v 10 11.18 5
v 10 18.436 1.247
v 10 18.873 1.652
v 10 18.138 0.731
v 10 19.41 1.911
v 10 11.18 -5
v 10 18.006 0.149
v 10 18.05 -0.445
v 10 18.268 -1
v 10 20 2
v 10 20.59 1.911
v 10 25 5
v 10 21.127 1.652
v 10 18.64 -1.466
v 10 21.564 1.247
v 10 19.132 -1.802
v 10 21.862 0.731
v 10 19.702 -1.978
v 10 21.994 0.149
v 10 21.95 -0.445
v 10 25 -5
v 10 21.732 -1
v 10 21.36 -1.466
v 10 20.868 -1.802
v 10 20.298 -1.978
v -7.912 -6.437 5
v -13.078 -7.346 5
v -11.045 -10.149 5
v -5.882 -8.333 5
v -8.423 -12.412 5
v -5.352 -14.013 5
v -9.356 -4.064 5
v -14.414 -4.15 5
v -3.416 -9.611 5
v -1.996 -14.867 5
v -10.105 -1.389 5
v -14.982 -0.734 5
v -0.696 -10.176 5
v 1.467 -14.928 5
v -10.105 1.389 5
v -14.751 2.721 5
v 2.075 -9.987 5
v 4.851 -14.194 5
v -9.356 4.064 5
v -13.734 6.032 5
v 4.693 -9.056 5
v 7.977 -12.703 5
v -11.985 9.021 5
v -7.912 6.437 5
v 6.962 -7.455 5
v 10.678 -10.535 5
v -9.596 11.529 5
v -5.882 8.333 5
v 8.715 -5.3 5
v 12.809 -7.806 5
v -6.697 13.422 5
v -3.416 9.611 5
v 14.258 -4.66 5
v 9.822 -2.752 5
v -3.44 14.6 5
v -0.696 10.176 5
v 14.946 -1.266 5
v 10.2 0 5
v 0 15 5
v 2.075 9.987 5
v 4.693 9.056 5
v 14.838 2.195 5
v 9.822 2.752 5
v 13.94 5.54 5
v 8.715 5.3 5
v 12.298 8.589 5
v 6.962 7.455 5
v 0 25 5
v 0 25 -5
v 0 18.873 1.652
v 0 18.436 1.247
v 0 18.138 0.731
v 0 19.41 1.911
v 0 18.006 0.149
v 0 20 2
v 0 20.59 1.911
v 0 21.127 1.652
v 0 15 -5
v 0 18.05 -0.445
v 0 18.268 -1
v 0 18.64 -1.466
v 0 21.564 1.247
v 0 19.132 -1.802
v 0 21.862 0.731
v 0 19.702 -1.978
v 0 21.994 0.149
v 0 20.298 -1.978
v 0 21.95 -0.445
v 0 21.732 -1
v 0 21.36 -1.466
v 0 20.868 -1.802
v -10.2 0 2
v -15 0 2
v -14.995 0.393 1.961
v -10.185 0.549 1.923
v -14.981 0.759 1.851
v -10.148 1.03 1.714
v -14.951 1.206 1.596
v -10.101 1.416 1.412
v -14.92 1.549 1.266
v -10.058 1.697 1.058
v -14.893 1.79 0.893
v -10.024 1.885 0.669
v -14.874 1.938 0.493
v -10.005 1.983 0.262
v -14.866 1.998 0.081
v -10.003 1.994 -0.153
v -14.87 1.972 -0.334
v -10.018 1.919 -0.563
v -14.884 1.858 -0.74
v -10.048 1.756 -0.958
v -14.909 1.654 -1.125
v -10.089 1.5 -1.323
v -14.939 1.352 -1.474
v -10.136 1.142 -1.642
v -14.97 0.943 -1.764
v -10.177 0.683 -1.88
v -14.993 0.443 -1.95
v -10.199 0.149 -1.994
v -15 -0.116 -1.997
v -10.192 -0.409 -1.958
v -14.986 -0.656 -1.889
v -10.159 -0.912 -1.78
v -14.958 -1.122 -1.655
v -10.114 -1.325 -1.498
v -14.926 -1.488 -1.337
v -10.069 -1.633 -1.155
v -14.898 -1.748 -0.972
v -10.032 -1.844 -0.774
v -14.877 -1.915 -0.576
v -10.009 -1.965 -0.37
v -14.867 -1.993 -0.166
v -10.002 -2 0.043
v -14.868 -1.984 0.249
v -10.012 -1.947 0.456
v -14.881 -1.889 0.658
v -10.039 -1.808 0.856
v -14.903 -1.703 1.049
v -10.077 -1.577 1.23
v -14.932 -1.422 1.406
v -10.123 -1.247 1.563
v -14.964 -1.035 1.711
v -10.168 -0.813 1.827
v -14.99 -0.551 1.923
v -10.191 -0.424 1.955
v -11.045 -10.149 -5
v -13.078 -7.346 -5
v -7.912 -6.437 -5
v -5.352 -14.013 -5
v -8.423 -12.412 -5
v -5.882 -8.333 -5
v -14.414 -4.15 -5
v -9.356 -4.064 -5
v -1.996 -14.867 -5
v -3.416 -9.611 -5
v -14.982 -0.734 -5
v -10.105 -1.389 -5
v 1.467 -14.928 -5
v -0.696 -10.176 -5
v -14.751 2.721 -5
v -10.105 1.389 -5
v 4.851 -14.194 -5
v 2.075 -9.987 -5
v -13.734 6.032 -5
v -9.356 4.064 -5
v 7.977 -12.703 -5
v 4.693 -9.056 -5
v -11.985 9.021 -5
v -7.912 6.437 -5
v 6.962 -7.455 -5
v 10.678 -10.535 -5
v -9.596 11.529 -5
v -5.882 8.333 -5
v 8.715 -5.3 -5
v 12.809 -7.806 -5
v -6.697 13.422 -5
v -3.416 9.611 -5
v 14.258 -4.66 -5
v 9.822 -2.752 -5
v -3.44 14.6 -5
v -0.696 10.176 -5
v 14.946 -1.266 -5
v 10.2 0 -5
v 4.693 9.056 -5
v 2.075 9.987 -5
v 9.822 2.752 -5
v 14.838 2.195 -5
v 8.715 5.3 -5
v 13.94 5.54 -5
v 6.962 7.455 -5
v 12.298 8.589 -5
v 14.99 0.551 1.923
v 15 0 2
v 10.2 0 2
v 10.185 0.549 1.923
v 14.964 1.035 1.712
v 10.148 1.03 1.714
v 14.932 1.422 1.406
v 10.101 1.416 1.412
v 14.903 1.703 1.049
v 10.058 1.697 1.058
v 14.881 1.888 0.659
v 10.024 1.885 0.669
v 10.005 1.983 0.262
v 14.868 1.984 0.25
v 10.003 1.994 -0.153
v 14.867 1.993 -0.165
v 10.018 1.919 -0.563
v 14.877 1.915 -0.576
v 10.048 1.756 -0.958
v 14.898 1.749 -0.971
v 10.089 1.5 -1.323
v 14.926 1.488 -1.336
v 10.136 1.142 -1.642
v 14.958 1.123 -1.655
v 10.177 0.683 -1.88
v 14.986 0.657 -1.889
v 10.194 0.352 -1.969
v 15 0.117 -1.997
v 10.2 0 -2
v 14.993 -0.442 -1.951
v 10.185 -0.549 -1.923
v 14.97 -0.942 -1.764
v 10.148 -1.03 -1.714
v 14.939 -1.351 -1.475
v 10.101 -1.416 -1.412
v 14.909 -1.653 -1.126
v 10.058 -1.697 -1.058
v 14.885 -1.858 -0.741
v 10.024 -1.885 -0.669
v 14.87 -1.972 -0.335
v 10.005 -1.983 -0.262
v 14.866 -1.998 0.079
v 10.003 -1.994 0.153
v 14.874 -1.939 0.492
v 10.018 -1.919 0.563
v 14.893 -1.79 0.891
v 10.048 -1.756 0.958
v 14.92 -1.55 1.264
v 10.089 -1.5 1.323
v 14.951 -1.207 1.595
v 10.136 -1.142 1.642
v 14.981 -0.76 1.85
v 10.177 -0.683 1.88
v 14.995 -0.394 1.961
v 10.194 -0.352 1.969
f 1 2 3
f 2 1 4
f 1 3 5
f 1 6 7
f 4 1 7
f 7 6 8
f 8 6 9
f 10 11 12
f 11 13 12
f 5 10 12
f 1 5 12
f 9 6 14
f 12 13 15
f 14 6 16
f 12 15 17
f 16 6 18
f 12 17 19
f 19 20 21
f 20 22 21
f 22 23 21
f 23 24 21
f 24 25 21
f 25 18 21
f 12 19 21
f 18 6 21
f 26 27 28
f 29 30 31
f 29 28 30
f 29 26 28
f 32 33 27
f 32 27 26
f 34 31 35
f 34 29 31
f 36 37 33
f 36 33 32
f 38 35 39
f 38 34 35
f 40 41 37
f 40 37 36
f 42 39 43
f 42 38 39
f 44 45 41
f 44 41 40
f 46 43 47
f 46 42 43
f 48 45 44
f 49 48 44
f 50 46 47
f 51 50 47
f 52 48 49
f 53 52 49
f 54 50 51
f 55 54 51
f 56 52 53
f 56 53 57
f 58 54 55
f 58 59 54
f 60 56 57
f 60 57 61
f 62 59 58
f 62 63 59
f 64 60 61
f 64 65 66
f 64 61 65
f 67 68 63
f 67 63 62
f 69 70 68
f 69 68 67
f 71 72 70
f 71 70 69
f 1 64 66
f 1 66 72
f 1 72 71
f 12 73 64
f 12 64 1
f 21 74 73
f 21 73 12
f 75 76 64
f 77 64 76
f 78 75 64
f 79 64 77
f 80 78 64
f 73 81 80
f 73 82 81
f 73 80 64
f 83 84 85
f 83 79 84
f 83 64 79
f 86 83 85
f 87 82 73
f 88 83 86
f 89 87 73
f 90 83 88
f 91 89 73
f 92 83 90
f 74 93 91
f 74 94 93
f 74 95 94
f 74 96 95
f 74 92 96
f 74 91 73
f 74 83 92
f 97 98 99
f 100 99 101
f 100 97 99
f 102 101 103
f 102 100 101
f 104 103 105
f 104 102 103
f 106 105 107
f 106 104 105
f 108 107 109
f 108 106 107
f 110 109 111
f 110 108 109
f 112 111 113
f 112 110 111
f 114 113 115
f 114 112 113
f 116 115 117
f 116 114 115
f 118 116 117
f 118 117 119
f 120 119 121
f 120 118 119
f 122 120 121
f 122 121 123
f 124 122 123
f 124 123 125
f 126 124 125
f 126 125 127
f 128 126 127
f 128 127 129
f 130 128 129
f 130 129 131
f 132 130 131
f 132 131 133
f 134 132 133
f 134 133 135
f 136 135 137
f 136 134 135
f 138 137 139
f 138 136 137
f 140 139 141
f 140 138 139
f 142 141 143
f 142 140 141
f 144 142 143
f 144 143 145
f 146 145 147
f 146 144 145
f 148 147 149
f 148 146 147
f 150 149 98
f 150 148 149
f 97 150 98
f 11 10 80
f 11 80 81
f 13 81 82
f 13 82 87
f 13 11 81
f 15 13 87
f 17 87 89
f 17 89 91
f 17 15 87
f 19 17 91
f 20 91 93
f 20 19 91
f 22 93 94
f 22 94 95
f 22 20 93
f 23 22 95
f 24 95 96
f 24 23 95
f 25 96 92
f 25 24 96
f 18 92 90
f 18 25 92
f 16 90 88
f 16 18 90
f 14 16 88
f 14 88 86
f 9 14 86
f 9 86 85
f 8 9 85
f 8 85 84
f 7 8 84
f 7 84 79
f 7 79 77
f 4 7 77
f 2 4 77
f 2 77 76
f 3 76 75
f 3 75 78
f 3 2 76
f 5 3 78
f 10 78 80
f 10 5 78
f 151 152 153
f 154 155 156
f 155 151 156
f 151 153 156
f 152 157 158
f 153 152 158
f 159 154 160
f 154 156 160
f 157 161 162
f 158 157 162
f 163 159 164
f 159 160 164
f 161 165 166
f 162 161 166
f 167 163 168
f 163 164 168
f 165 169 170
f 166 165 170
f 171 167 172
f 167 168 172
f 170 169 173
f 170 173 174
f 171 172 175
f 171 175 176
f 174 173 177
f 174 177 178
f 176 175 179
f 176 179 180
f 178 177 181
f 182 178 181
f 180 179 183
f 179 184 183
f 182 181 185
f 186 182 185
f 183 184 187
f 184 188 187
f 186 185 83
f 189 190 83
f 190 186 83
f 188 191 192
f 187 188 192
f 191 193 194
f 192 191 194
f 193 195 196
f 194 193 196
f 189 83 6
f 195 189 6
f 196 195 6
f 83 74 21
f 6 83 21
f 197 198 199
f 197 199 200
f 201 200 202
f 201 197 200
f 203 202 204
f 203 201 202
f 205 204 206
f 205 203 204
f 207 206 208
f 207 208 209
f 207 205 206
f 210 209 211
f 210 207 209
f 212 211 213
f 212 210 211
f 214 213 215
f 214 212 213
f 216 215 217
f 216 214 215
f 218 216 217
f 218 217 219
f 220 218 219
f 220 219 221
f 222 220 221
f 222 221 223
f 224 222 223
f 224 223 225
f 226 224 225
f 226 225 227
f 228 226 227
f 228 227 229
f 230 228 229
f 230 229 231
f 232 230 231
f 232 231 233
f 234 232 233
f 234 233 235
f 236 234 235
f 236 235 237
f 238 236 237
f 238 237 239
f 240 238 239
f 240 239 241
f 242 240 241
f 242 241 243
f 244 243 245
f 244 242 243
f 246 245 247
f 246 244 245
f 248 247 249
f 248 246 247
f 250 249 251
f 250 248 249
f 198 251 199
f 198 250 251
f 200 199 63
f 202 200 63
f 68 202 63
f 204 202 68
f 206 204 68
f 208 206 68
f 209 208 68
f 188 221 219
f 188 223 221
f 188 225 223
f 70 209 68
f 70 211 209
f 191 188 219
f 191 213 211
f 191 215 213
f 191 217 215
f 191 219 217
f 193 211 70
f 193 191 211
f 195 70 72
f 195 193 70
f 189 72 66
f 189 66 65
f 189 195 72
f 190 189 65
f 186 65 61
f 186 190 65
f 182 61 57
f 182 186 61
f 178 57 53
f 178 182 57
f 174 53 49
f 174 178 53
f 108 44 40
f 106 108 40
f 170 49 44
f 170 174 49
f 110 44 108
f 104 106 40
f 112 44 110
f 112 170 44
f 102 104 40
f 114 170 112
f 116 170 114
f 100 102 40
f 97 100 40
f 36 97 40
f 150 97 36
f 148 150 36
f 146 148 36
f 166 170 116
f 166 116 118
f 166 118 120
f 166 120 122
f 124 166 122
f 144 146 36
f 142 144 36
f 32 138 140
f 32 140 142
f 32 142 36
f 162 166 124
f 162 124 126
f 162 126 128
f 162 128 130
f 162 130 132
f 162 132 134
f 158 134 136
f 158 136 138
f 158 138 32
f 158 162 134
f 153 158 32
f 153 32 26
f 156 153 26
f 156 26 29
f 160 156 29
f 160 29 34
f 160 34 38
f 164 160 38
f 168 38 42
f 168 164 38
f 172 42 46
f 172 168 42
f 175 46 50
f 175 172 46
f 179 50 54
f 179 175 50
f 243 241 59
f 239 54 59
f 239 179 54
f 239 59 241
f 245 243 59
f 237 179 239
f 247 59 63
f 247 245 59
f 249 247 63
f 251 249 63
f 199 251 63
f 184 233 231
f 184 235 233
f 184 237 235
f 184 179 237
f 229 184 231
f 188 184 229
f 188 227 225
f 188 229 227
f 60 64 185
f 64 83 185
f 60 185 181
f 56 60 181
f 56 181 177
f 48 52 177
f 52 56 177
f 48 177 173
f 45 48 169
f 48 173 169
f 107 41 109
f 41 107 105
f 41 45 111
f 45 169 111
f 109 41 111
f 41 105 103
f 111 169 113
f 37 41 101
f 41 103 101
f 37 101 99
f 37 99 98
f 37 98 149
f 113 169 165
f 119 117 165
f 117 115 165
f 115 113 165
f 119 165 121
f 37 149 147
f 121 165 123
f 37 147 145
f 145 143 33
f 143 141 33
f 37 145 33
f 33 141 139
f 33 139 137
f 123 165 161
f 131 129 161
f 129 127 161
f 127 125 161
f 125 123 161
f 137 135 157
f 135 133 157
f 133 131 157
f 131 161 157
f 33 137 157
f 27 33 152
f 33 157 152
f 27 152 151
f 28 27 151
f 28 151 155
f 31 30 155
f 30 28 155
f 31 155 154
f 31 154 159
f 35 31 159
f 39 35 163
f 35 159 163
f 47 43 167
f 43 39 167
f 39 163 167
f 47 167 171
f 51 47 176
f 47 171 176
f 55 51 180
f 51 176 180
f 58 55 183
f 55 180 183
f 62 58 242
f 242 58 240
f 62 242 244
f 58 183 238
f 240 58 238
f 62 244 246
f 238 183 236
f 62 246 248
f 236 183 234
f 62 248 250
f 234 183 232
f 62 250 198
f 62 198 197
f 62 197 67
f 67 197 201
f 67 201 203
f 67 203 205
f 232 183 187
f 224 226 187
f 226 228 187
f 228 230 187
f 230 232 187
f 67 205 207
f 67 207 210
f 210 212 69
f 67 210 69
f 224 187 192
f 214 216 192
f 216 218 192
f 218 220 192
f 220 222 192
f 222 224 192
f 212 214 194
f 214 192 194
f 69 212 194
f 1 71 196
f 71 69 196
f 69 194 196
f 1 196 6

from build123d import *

# Parameters (mm, degrees)
CYLINDER003_R     = 2
CYLINDER003_DEPTH = 10
CYLINDER004_R     = 2
CYLINDER004_DEPTH = 30
CYLINDER001_R     = 10.2
CYLINDER001_DEPTH = 10
BOX_W             = 10
BOX_H             = 15
BOX_DEPTH         = 10
CYLINDER_R        = 15
CYLINDER_DEPTH    = 10


with BuildPart() as cylinder003:
    # Cylinder003 → Cylinder003 (new body)
    with BuildSketch(Plane(origin=(10, 20, 0), x_dir=(0, 0, 1), z_dir=(-1, 0, 0))):
        Circle(CYLINDER003_R)
    extrude(amount=CYLINDER003_DEPTH)


with BuildPart() as cylinder004:
    # Cylinder004 → Cylinder004 (new body)
    with BuildSketch(Plane.ZY.offset(-15)):
        Circle(CYLINDER004_R)
    extrude(amount=CYLINDER004_DEPTH)


with BuildPart() as negative_fusion:
    # Cylinder001 → Cylinder001 (new body)
    with BuildSketch(Plane.XY.offset(-5)):
        Circle(CYLINDER001_R)
    extrude(amount=CYLINDER001_DEPTH)

    # Fusion: union Cylinder003, Cylinder004
    add(cylinder003.part)
    add(cylinder004.part)


with BuildPart() as cube:
    # Box → Box (new body)
    with BuildSketch(Plane(origin=(0, 10, -5), x_dir=(1, 0, 0), z_dir=(0, 0, 1))):
        with Locations((5, 7.5)):
            Rectangle(BOX_W, BOX_H)
    extrude(amount=BOX_DEPTH)


with BuildPart() as cut:
    # Cylinder → Cylinder (new body)
    with BuildSketch(Plane.XY.offset(-5)):
        Circle(CYLINDER_R)
    extrude(amount=CYLINDER_DEPTH)

    # Fusion001: union Cube
    add(cube.part)

    # Cut: cut Negative Fusion
    add(negative_fusion.part, mode=Mode.SUBTRACT)


solid = cut.part
